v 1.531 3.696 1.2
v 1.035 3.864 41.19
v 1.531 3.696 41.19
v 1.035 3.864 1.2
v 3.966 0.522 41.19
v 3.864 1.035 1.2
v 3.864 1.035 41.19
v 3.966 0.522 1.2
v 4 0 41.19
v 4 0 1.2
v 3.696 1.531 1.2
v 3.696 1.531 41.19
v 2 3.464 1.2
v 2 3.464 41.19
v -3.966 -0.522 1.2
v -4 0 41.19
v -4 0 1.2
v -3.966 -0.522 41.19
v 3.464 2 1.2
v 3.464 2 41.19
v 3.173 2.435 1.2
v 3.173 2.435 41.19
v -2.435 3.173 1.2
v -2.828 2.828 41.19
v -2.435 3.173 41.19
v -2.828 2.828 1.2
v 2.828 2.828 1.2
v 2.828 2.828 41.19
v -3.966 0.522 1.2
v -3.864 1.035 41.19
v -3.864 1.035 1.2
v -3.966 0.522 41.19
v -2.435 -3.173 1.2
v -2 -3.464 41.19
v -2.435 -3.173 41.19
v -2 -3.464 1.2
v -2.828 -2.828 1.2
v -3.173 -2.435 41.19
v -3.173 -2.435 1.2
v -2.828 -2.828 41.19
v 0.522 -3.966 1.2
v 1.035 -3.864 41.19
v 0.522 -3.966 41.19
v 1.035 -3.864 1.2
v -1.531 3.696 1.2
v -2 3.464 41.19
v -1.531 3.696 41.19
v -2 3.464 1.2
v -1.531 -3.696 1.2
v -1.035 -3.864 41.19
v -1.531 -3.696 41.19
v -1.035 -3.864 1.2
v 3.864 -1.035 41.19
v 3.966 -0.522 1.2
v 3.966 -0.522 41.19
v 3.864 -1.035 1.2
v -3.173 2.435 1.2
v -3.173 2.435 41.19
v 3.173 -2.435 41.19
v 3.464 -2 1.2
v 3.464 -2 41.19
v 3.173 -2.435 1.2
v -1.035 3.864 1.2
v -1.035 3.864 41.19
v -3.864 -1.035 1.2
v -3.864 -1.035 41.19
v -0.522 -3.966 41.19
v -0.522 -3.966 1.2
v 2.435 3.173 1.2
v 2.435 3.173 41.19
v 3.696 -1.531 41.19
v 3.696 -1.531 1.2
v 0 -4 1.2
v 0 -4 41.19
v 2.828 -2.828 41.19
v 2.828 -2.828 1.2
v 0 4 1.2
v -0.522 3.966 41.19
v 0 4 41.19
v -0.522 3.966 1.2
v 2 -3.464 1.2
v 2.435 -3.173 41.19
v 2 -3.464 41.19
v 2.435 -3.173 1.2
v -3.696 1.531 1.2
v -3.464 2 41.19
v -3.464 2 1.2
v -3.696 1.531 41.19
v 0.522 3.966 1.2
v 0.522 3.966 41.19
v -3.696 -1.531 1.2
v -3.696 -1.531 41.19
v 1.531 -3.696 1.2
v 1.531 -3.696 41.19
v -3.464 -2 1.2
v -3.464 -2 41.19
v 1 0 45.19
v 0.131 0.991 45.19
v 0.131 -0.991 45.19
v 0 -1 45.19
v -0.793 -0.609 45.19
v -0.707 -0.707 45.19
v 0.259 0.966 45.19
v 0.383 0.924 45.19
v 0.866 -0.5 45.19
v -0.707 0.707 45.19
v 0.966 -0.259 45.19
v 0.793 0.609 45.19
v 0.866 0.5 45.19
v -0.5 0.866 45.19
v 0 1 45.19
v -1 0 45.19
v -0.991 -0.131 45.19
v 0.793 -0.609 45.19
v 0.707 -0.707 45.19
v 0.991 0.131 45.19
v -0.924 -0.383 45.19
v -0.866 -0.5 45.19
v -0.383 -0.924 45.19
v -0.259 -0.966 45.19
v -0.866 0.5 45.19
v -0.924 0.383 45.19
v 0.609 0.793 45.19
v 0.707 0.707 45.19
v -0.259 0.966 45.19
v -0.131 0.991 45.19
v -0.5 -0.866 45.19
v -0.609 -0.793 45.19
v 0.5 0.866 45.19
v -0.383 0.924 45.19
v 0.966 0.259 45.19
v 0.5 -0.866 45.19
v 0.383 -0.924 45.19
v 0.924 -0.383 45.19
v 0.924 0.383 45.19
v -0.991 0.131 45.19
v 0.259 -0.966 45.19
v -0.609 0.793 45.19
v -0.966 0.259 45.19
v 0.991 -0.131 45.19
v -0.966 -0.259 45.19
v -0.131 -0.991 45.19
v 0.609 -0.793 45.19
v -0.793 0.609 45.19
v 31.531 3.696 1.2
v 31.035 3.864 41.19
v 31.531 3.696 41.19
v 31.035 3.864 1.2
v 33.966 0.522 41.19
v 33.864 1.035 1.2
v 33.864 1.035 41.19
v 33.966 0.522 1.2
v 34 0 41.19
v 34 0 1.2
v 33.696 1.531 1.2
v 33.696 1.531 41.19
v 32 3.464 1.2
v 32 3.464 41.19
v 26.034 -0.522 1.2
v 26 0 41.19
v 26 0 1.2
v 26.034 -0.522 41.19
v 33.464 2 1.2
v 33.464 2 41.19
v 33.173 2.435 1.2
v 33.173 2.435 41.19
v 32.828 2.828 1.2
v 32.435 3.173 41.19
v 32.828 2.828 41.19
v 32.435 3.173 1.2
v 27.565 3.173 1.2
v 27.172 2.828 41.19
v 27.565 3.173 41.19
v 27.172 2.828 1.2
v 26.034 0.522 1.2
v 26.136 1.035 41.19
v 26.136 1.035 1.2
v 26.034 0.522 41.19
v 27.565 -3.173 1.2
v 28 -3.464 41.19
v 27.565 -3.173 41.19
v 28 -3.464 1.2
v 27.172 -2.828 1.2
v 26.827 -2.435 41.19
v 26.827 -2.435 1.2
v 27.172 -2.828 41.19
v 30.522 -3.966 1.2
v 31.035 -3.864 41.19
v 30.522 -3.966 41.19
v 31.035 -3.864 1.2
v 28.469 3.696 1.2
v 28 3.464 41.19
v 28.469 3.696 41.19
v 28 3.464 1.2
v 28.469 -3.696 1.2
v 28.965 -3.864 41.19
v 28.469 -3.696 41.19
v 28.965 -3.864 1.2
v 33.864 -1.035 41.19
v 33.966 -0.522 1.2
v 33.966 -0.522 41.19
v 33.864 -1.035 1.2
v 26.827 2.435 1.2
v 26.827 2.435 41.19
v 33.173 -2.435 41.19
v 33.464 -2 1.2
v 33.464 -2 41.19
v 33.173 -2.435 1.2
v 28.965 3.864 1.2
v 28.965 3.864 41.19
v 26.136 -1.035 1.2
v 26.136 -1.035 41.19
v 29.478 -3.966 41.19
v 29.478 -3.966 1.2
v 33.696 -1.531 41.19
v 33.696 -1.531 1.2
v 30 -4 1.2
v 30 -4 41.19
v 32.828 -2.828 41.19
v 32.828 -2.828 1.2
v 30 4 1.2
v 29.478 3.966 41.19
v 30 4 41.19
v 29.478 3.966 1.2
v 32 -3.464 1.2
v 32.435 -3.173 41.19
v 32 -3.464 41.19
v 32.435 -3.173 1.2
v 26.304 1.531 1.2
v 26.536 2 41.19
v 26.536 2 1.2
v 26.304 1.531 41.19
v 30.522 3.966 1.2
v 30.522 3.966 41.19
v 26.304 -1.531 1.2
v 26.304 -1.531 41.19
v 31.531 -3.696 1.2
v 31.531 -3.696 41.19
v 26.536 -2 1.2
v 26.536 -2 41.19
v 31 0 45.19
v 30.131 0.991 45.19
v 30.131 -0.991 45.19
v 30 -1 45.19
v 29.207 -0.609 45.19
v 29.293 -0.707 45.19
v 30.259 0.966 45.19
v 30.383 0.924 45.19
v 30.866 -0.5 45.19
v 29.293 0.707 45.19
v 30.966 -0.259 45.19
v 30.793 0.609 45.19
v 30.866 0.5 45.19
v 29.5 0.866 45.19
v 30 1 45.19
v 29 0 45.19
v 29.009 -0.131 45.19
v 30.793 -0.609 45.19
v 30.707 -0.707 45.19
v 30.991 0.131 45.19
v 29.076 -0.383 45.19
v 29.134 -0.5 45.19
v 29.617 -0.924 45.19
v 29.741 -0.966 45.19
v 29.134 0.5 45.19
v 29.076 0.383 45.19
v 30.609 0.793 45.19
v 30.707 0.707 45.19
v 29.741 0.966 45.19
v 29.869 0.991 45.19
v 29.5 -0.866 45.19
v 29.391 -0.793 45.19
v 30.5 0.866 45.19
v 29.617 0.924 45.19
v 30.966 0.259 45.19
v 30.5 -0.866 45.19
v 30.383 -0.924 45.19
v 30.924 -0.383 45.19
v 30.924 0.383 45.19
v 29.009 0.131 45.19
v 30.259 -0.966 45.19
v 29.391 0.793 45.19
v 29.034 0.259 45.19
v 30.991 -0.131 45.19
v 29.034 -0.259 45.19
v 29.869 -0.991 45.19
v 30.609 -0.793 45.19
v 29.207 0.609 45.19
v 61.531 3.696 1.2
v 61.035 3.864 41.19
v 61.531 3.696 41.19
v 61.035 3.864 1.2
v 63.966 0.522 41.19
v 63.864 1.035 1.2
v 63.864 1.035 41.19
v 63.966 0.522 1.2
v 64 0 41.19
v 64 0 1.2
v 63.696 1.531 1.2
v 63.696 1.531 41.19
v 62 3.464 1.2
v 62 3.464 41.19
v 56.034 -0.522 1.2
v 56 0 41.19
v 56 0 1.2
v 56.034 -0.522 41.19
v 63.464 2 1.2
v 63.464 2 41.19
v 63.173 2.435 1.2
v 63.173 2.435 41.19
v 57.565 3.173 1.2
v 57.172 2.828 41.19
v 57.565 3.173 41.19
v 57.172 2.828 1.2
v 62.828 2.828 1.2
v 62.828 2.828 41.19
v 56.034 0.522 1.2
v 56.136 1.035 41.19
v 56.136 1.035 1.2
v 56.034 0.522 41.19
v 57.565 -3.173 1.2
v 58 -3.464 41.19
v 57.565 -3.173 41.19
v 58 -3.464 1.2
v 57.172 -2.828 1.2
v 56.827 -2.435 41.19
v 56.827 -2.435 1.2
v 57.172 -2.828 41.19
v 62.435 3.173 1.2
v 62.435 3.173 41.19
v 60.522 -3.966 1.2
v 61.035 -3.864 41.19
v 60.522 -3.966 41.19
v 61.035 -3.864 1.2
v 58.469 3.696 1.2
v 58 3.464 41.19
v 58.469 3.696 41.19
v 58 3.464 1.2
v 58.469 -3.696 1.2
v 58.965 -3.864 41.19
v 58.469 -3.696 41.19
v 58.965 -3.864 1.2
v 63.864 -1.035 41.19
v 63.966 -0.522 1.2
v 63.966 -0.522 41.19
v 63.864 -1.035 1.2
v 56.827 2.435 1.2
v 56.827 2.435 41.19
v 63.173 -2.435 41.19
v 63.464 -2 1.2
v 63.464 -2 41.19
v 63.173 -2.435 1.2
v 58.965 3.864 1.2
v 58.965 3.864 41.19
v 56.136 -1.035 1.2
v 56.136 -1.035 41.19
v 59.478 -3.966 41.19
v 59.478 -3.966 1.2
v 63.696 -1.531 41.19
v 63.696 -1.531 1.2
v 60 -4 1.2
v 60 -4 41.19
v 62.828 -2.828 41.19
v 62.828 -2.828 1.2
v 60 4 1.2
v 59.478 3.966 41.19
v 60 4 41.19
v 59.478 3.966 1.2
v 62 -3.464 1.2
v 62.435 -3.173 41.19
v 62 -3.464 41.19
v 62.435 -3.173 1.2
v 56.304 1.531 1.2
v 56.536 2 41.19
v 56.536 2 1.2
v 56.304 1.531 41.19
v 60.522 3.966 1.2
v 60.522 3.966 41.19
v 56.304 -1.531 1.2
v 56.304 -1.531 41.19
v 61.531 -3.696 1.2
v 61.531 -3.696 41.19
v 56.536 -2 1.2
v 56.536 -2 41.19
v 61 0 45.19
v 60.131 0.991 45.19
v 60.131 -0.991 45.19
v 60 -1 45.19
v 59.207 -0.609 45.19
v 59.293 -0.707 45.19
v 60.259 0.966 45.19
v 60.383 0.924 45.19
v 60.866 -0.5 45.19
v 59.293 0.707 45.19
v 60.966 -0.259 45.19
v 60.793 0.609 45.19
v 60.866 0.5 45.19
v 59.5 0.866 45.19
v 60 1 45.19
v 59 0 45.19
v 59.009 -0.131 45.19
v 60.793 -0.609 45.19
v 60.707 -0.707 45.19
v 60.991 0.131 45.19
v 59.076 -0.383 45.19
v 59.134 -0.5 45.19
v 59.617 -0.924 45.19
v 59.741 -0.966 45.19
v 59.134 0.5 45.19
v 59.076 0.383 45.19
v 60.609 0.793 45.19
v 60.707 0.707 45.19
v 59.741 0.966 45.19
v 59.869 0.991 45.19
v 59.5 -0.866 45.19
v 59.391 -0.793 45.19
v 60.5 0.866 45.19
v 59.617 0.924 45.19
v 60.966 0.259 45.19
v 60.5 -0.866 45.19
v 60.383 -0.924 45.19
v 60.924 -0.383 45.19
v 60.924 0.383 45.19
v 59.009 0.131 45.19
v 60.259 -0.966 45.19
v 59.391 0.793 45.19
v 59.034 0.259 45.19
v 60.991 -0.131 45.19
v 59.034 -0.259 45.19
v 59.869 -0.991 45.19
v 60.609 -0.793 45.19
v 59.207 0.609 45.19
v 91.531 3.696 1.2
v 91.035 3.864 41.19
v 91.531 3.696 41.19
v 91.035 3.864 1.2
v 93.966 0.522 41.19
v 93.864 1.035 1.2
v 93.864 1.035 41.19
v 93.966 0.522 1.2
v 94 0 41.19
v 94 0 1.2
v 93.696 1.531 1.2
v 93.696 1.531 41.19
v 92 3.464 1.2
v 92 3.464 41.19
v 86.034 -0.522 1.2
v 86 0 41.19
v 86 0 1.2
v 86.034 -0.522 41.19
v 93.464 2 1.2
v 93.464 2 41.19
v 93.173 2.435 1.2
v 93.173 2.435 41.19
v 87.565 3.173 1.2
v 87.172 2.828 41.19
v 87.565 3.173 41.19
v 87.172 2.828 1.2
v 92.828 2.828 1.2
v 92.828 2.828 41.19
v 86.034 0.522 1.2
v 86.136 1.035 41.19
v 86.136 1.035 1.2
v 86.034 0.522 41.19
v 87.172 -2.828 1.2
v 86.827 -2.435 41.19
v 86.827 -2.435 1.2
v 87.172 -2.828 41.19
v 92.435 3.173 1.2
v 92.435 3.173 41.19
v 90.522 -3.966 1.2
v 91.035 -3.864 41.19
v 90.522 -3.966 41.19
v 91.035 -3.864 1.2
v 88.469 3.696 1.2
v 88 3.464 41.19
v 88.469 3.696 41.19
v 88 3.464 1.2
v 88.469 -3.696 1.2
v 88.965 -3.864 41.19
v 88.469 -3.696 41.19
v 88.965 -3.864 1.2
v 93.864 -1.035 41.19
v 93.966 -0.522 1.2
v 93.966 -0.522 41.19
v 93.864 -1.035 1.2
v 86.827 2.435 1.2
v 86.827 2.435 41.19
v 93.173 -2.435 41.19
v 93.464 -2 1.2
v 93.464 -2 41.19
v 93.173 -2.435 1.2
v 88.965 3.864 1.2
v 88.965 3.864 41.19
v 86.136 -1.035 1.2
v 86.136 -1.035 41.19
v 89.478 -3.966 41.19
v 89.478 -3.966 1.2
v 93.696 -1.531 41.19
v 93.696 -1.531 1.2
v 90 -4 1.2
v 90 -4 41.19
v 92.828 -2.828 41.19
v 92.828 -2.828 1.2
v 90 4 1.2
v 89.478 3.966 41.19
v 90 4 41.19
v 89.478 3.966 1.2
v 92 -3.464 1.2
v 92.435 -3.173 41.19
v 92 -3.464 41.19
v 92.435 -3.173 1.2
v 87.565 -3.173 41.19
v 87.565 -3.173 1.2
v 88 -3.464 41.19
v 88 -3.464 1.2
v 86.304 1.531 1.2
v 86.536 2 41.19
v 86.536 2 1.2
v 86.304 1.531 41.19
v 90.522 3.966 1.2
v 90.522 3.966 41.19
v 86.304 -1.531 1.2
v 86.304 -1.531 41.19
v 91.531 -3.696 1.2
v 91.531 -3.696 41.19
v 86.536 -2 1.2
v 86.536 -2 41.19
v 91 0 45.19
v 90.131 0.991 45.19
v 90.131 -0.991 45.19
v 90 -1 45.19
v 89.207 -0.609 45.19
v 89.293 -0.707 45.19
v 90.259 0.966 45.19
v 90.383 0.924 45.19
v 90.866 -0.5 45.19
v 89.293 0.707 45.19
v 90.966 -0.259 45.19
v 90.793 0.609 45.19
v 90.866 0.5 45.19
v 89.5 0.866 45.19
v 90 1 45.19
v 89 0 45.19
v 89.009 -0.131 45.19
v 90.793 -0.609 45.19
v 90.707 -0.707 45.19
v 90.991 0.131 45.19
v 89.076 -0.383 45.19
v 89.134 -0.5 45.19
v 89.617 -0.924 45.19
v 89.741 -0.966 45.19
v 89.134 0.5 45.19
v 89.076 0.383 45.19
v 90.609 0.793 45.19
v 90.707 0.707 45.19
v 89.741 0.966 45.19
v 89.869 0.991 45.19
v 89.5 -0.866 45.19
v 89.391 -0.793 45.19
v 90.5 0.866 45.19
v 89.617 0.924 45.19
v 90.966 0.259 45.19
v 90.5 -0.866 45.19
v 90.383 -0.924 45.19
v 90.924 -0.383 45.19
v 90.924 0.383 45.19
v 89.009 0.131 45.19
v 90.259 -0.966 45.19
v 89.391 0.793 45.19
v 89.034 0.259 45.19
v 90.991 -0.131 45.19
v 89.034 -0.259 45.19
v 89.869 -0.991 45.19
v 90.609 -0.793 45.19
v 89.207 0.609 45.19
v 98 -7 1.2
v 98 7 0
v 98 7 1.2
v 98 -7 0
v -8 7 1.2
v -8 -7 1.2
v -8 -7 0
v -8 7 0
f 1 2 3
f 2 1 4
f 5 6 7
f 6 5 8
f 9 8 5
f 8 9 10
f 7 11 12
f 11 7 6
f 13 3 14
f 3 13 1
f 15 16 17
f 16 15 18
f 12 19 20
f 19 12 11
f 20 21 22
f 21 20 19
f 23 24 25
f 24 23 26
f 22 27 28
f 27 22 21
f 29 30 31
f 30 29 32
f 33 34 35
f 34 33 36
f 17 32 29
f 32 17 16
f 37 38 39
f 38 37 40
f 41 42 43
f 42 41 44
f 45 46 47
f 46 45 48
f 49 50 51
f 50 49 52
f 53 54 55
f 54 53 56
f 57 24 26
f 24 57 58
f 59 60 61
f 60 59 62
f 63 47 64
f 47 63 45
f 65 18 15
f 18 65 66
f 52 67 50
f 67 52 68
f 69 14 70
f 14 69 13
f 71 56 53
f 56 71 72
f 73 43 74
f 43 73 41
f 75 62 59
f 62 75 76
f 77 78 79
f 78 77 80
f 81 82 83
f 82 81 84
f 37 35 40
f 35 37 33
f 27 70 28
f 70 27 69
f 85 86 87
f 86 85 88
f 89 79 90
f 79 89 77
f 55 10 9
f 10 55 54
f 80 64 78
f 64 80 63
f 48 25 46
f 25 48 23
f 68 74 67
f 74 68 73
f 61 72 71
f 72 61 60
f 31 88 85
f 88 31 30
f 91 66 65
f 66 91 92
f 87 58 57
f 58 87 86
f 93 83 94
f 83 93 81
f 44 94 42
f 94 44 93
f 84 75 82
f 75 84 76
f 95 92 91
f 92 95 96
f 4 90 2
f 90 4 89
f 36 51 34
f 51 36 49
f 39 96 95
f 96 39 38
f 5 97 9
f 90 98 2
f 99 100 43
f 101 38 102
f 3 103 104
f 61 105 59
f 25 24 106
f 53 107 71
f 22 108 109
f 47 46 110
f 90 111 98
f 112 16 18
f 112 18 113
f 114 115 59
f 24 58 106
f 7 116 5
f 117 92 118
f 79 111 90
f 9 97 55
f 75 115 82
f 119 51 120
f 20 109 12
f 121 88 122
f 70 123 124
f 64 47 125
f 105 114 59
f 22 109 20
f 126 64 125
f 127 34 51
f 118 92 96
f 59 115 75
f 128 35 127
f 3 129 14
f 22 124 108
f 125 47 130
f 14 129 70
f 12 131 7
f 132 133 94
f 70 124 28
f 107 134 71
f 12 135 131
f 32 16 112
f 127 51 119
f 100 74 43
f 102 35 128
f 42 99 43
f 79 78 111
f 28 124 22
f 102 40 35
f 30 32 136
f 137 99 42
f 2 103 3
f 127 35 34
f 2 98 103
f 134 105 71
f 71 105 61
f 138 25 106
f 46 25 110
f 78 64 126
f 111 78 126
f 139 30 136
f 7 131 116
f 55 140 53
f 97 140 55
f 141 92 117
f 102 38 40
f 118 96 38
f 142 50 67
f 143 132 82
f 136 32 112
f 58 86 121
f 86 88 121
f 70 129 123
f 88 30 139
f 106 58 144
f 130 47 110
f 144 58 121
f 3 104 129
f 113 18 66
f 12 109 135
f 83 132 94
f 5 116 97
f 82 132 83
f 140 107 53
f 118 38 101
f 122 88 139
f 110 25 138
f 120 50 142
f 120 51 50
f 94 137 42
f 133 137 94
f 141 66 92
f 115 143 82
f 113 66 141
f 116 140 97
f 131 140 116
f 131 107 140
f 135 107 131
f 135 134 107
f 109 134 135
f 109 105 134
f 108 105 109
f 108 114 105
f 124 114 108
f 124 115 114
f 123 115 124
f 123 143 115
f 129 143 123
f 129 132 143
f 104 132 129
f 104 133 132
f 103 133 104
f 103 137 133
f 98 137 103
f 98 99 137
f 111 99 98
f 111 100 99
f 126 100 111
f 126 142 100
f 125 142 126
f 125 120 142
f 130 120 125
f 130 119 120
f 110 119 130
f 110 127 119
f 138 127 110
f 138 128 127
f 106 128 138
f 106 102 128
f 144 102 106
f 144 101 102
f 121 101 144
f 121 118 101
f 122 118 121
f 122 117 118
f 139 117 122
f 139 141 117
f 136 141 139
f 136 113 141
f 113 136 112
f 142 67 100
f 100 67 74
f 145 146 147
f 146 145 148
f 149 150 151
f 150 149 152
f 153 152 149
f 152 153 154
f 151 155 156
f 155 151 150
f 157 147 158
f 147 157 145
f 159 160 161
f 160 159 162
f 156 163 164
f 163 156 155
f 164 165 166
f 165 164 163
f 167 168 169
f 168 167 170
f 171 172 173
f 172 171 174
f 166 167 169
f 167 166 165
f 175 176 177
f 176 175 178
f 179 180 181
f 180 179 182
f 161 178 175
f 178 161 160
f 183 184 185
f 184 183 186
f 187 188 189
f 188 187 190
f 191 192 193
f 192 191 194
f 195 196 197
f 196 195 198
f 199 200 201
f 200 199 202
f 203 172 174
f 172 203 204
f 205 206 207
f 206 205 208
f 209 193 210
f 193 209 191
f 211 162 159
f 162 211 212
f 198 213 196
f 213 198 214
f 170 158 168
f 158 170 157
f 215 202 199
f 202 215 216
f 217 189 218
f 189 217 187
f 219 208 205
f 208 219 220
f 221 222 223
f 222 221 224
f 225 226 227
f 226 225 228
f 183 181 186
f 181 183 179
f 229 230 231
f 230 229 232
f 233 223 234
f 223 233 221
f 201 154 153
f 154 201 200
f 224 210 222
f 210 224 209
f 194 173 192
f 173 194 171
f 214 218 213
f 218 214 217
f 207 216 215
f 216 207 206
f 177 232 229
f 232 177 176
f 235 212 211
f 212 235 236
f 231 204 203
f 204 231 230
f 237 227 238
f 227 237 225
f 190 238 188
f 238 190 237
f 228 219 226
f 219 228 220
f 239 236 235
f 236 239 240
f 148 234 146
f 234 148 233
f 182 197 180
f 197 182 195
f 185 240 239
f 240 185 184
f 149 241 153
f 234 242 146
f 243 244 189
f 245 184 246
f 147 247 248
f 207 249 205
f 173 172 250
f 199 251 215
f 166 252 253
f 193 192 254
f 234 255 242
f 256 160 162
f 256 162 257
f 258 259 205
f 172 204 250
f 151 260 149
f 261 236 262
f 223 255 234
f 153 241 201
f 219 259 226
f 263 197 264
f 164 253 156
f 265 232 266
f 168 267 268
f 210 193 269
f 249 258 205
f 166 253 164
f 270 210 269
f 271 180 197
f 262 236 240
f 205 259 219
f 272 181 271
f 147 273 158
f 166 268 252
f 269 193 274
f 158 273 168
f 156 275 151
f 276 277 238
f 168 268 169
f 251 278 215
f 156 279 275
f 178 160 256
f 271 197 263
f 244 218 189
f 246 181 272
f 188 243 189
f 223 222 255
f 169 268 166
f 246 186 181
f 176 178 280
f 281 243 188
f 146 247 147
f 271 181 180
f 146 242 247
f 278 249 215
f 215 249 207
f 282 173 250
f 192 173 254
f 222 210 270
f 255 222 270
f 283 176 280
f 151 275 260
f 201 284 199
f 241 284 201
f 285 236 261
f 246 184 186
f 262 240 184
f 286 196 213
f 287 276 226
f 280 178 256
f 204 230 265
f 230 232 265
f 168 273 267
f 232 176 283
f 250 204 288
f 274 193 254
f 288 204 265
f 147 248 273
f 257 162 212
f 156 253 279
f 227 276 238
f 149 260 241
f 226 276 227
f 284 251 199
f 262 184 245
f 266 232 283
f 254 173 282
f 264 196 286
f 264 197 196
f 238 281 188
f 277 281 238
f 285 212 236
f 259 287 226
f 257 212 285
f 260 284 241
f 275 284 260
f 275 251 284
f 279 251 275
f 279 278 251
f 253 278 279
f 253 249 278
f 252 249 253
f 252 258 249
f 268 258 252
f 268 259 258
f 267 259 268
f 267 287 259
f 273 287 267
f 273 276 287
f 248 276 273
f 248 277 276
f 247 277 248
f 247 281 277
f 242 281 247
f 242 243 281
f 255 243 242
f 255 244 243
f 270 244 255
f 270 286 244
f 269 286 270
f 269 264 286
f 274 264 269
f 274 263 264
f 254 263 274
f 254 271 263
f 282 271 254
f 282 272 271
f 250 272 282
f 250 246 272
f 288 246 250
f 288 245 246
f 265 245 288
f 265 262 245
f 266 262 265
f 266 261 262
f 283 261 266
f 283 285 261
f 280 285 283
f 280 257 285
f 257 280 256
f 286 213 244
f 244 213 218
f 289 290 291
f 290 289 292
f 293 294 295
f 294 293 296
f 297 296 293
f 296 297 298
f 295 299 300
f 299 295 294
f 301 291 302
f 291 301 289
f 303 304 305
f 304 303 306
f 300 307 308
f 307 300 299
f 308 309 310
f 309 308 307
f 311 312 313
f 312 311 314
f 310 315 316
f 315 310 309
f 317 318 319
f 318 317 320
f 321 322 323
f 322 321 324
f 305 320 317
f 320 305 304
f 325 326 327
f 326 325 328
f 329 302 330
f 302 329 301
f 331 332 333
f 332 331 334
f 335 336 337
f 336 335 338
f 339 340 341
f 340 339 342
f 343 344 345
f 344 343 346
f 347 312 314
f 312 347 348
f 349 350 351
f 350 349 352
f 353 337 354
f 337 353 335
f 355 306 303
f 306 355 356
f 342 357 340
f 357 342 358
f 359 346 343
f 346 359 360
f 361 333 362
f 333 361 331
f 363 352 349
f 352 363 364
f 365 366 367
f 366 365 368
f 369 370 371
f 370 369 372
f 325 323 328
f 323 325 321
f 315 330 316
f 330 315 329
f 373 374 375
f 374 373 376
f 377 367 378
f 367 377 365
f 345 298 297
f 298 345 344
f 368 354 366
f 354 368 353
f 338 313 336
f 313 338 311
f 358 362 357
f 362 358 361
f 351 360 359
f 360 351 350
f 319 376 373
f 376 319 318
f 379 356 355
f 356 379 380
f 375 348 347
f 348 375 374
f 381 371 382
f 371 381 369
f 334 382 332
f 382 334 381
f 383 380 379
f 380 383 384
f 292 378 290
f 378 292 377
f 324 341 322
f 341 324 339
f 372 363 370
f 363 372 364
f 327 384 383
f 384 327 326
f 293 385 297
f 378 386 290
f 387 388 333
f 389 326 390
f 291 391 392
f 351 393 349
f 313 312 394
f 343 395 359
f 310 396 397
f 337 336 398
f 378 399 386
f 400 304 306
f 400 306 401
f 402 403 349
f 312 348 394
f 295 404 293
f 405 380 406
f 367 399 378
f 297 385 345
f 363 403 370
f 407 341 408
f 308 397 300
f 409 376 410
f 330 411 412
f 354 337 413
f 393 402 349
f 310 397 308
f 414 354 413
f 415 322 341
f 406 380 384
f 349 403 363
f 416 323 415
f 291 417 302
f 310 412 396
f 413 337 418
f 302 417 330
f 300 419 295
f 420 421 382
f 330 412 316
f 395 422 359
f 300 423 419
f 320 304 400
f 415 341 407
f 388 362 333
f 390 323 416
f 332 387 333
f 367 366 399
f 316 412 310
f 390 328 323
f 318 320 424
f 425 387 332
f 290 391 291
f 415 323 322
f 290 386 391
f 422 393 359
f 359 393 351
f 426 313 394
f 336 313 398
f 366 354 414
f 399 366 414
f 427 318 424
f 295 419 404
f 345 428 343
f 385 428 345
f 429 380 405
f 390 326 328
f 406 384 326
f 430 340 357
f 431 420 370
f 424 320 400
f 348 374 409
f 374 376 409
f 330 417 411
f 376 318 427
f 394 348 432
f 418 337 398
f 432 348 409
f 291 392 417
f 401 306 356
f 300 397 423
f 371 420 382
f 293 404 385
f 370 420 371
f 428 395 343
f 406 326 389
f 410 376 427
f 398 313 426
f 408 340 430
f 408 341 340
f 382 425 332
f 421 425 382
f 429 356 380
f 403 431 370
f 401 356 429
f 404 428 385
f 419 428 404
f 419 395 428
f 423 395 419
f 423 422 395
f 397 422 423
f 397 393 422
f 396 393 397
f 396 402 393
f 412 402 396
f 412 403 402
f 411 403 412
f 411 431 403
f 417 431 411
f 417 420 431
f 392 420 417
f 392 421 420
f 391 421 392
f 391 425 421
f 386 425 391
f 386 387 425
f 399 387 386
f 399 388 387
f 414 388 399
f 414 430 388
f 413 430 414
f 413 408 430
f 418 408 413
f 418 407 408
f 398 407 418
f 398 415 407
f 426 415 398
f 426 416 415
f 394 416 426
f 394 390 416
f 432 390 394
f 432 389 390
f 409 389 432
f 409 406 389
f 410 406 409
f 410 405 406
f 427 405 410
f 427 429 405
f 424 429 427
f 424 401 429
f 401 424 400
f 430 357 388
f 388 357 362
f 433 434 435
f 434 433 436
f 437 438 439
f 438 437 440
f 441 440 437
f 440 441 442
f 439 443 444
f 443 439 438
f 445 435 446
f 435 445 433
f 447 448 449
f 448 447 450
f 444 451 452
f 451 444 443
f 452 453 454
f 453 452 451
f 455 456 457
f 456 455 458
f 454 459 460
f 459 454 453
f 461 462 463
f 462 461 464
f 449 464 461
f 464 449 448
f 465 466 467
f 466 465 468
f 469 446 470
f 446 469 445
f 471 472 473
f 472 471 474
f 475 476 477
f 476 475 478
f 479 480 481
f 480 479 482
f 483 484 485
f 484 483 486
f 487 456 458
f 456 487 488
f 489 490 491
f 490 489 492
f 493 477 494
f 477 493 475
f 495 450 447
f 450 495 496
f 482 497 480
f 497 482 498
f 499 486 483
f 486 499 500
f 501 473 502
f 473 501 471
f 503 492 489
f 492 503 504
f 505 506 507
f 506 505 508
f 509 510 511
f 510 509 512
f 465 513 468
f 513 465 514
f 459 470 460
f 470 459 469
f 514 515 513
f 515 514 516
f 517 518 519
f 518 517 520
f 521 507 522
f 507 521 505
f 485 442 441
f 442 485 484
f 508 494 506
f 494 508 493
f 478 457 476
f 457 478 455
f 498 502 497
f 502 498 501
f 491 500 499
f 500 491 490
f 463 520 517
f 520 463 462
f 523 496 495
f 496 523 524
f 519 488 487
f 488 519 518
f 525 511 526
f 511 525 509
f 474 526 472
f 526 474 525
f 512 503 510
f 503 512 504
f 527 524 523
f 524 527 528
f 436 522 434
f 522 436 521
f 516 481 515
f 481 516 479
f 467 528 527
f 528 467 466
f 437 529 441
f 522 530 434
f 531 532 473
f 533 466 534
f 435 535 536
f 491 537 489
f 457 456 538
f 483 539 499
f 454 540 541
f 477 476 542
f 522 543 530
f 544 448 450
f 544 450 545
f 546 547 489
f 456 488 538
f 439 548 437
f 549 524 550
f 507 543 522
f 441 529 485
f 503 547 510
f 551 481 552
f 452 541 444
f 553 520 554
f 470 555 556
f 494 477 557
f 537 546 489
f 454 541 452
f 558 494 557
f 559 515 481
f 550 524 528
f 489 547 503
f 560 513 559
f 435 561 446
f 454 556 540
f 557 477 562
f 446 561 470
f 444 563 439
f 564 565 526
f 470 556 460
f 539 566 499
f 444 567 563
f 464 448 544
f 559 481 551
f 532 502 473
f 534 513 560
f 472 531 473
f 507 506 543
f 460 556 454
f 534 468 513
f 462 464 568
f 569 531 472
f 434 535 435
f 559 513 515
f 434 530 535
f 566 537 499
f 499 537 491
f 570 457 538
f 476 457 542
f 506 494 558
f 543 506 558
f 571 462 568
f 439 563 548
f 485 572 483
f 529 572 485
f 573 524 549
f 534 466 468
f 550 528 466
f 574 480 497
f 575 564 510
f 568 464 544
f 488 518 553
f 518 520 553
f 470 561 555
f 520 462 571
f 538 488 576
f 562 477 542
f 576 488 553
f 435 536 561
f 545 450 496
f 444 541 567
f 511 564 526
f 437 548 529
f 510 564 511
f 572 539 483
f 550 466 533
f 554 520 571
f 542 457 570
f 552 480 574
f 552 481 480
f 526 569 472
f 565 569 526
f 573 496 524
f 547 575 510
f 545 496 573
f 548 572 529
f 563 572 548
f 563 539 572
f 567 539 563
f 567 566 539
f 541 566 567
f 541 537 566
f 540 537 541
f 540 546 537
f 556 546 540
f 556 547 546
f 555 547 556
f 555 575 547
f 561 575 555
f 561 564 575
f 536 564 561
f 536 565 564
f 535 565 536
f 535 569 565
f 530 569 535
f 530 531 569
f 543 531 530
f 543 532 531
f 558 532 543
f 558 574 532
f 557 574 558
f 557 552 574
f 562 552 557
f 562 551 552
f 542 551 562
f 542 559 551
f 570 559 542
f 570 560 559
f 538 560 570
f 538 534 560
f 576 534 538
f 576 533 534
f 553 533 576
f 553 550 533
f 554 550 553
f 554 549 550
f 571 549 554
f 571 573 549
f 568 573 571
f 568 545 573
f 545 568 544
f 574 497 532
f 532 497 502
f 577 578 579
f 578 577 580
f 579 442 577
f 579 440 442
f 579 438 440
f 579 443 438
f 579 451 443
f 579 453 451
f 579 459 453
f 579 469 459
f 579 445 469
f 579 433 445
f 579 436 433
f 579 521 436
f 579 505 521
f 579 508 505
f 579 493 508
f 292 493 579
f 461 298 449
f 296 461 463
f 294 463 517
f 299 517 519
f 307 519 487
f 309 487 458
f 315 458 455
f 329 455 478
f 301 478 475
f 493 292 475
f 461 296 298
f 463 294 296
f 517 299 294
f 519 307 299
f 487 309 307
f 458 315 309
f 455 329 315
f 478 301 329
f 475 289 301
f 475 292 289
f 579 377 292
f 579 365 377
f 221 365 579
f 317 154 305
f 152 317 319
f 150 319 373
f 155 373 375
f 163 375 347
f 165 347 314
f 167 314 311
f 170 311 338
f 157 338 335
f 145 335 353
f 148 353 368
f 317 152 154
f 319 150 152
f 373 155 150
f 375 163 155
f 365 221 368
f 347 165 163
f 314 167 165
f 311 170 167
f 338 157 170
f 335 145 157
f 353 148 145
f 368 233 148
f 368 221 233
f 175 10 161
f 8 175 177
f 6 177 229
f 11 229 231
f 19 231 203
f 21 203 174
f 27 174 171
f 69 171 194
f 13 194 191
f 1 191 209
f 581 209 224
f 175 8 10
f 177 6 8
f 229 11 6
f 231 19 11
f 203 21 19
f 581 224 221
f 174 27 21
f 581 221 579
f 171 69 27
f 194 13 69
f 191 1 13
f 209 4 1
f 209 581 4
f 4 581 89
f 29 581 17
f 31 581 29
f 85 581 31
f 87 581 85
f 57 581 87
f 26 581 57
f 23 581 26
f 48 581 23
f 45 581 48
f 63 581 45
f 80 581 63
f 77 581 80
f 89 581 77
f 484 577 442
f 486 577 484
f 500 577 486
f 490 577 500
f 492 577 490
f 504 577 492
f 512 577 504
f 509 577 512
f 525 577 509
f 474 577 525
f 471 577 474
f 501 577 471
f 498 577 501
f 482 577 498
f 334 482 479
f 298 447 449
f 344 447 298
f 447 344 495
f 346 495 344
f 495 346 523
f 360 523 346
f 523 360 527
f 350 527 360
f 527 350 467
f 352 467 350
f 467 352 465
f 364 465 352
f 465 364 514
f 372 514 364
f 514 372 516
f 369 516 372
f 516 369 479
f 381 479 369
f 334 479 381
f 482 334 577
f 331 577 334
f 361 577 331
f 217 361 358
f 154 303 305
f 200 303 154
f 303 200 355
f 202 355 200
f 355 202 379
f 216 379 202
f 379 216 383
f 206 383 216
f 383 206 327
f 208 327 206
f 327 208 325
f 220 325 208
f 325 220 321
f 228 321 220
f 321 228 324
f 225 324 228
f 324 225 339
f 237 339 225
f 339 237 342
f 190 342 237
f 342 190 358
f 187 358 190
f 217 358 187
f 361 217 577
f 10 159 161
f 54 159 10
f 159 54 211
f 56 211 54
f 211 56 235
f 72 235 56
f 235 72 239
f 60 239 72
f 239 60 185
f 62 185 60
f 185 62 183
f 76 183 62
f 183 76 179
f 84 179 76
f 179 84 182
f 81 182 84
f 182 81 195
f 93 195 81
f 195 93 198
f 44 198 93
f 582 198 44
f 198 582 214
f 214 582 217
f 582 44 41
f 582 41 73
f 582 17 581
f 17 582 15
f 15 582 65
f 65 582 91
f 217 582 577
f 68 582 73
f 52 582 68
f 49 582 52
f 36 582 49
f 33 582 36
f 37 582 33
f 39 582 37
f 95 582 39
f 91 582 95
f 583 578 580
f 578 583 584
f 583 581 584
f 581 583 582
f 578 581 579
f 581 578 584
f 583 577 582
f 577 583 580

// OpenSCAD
// ---------------------------------------------------------------
// retraction_test.scad  -  stringing test with travel moves
// Used in: Level 2 exercise L2-2, Level 1 exercise L1-11 (optional)
//
// Several thin towers stand on a thin base plate.  The print head must
// travel across open air between the towers on every layer, so any ooze
// shows up as fine strings between them.  Change ONE retraction setting
// at a time (length, speed, temperature) between prints, or use
// the slicer's layer-based retraction override to test several values
// in one print.
// Units: millimeters.
// ---------------------------------------------------------------

towers   = 4;      // number of towers in a row
tower_d  = 8;      // tower diameter
tower_h  = 40;     // tower height
spacing  = 30;     // center distance between towers
base_h   = 1.2;    // thin base plate (keeps the towers together)
base_w   = 14;     // base plate width
$fn      = 48;

base_len = (towers - 1) * spacing + tower_d + 8;

// thin base plate
translate([-tower_d / 2 - 4, -base_w / 2, 0])
    cube([base_len, base_w, base_h]);

for (i = [0 : towers - 1])
    translate([i * spacing, 0, base_h - 0.01]) {
        cylinder(d = tower_d, h = tower_h);
        // a small cone on top avoids a flat blob at the end of the print
        translate([0, 0, tower_h]) cylinder(d1 = tower_d, d2 = 2, h = 4);
    }
